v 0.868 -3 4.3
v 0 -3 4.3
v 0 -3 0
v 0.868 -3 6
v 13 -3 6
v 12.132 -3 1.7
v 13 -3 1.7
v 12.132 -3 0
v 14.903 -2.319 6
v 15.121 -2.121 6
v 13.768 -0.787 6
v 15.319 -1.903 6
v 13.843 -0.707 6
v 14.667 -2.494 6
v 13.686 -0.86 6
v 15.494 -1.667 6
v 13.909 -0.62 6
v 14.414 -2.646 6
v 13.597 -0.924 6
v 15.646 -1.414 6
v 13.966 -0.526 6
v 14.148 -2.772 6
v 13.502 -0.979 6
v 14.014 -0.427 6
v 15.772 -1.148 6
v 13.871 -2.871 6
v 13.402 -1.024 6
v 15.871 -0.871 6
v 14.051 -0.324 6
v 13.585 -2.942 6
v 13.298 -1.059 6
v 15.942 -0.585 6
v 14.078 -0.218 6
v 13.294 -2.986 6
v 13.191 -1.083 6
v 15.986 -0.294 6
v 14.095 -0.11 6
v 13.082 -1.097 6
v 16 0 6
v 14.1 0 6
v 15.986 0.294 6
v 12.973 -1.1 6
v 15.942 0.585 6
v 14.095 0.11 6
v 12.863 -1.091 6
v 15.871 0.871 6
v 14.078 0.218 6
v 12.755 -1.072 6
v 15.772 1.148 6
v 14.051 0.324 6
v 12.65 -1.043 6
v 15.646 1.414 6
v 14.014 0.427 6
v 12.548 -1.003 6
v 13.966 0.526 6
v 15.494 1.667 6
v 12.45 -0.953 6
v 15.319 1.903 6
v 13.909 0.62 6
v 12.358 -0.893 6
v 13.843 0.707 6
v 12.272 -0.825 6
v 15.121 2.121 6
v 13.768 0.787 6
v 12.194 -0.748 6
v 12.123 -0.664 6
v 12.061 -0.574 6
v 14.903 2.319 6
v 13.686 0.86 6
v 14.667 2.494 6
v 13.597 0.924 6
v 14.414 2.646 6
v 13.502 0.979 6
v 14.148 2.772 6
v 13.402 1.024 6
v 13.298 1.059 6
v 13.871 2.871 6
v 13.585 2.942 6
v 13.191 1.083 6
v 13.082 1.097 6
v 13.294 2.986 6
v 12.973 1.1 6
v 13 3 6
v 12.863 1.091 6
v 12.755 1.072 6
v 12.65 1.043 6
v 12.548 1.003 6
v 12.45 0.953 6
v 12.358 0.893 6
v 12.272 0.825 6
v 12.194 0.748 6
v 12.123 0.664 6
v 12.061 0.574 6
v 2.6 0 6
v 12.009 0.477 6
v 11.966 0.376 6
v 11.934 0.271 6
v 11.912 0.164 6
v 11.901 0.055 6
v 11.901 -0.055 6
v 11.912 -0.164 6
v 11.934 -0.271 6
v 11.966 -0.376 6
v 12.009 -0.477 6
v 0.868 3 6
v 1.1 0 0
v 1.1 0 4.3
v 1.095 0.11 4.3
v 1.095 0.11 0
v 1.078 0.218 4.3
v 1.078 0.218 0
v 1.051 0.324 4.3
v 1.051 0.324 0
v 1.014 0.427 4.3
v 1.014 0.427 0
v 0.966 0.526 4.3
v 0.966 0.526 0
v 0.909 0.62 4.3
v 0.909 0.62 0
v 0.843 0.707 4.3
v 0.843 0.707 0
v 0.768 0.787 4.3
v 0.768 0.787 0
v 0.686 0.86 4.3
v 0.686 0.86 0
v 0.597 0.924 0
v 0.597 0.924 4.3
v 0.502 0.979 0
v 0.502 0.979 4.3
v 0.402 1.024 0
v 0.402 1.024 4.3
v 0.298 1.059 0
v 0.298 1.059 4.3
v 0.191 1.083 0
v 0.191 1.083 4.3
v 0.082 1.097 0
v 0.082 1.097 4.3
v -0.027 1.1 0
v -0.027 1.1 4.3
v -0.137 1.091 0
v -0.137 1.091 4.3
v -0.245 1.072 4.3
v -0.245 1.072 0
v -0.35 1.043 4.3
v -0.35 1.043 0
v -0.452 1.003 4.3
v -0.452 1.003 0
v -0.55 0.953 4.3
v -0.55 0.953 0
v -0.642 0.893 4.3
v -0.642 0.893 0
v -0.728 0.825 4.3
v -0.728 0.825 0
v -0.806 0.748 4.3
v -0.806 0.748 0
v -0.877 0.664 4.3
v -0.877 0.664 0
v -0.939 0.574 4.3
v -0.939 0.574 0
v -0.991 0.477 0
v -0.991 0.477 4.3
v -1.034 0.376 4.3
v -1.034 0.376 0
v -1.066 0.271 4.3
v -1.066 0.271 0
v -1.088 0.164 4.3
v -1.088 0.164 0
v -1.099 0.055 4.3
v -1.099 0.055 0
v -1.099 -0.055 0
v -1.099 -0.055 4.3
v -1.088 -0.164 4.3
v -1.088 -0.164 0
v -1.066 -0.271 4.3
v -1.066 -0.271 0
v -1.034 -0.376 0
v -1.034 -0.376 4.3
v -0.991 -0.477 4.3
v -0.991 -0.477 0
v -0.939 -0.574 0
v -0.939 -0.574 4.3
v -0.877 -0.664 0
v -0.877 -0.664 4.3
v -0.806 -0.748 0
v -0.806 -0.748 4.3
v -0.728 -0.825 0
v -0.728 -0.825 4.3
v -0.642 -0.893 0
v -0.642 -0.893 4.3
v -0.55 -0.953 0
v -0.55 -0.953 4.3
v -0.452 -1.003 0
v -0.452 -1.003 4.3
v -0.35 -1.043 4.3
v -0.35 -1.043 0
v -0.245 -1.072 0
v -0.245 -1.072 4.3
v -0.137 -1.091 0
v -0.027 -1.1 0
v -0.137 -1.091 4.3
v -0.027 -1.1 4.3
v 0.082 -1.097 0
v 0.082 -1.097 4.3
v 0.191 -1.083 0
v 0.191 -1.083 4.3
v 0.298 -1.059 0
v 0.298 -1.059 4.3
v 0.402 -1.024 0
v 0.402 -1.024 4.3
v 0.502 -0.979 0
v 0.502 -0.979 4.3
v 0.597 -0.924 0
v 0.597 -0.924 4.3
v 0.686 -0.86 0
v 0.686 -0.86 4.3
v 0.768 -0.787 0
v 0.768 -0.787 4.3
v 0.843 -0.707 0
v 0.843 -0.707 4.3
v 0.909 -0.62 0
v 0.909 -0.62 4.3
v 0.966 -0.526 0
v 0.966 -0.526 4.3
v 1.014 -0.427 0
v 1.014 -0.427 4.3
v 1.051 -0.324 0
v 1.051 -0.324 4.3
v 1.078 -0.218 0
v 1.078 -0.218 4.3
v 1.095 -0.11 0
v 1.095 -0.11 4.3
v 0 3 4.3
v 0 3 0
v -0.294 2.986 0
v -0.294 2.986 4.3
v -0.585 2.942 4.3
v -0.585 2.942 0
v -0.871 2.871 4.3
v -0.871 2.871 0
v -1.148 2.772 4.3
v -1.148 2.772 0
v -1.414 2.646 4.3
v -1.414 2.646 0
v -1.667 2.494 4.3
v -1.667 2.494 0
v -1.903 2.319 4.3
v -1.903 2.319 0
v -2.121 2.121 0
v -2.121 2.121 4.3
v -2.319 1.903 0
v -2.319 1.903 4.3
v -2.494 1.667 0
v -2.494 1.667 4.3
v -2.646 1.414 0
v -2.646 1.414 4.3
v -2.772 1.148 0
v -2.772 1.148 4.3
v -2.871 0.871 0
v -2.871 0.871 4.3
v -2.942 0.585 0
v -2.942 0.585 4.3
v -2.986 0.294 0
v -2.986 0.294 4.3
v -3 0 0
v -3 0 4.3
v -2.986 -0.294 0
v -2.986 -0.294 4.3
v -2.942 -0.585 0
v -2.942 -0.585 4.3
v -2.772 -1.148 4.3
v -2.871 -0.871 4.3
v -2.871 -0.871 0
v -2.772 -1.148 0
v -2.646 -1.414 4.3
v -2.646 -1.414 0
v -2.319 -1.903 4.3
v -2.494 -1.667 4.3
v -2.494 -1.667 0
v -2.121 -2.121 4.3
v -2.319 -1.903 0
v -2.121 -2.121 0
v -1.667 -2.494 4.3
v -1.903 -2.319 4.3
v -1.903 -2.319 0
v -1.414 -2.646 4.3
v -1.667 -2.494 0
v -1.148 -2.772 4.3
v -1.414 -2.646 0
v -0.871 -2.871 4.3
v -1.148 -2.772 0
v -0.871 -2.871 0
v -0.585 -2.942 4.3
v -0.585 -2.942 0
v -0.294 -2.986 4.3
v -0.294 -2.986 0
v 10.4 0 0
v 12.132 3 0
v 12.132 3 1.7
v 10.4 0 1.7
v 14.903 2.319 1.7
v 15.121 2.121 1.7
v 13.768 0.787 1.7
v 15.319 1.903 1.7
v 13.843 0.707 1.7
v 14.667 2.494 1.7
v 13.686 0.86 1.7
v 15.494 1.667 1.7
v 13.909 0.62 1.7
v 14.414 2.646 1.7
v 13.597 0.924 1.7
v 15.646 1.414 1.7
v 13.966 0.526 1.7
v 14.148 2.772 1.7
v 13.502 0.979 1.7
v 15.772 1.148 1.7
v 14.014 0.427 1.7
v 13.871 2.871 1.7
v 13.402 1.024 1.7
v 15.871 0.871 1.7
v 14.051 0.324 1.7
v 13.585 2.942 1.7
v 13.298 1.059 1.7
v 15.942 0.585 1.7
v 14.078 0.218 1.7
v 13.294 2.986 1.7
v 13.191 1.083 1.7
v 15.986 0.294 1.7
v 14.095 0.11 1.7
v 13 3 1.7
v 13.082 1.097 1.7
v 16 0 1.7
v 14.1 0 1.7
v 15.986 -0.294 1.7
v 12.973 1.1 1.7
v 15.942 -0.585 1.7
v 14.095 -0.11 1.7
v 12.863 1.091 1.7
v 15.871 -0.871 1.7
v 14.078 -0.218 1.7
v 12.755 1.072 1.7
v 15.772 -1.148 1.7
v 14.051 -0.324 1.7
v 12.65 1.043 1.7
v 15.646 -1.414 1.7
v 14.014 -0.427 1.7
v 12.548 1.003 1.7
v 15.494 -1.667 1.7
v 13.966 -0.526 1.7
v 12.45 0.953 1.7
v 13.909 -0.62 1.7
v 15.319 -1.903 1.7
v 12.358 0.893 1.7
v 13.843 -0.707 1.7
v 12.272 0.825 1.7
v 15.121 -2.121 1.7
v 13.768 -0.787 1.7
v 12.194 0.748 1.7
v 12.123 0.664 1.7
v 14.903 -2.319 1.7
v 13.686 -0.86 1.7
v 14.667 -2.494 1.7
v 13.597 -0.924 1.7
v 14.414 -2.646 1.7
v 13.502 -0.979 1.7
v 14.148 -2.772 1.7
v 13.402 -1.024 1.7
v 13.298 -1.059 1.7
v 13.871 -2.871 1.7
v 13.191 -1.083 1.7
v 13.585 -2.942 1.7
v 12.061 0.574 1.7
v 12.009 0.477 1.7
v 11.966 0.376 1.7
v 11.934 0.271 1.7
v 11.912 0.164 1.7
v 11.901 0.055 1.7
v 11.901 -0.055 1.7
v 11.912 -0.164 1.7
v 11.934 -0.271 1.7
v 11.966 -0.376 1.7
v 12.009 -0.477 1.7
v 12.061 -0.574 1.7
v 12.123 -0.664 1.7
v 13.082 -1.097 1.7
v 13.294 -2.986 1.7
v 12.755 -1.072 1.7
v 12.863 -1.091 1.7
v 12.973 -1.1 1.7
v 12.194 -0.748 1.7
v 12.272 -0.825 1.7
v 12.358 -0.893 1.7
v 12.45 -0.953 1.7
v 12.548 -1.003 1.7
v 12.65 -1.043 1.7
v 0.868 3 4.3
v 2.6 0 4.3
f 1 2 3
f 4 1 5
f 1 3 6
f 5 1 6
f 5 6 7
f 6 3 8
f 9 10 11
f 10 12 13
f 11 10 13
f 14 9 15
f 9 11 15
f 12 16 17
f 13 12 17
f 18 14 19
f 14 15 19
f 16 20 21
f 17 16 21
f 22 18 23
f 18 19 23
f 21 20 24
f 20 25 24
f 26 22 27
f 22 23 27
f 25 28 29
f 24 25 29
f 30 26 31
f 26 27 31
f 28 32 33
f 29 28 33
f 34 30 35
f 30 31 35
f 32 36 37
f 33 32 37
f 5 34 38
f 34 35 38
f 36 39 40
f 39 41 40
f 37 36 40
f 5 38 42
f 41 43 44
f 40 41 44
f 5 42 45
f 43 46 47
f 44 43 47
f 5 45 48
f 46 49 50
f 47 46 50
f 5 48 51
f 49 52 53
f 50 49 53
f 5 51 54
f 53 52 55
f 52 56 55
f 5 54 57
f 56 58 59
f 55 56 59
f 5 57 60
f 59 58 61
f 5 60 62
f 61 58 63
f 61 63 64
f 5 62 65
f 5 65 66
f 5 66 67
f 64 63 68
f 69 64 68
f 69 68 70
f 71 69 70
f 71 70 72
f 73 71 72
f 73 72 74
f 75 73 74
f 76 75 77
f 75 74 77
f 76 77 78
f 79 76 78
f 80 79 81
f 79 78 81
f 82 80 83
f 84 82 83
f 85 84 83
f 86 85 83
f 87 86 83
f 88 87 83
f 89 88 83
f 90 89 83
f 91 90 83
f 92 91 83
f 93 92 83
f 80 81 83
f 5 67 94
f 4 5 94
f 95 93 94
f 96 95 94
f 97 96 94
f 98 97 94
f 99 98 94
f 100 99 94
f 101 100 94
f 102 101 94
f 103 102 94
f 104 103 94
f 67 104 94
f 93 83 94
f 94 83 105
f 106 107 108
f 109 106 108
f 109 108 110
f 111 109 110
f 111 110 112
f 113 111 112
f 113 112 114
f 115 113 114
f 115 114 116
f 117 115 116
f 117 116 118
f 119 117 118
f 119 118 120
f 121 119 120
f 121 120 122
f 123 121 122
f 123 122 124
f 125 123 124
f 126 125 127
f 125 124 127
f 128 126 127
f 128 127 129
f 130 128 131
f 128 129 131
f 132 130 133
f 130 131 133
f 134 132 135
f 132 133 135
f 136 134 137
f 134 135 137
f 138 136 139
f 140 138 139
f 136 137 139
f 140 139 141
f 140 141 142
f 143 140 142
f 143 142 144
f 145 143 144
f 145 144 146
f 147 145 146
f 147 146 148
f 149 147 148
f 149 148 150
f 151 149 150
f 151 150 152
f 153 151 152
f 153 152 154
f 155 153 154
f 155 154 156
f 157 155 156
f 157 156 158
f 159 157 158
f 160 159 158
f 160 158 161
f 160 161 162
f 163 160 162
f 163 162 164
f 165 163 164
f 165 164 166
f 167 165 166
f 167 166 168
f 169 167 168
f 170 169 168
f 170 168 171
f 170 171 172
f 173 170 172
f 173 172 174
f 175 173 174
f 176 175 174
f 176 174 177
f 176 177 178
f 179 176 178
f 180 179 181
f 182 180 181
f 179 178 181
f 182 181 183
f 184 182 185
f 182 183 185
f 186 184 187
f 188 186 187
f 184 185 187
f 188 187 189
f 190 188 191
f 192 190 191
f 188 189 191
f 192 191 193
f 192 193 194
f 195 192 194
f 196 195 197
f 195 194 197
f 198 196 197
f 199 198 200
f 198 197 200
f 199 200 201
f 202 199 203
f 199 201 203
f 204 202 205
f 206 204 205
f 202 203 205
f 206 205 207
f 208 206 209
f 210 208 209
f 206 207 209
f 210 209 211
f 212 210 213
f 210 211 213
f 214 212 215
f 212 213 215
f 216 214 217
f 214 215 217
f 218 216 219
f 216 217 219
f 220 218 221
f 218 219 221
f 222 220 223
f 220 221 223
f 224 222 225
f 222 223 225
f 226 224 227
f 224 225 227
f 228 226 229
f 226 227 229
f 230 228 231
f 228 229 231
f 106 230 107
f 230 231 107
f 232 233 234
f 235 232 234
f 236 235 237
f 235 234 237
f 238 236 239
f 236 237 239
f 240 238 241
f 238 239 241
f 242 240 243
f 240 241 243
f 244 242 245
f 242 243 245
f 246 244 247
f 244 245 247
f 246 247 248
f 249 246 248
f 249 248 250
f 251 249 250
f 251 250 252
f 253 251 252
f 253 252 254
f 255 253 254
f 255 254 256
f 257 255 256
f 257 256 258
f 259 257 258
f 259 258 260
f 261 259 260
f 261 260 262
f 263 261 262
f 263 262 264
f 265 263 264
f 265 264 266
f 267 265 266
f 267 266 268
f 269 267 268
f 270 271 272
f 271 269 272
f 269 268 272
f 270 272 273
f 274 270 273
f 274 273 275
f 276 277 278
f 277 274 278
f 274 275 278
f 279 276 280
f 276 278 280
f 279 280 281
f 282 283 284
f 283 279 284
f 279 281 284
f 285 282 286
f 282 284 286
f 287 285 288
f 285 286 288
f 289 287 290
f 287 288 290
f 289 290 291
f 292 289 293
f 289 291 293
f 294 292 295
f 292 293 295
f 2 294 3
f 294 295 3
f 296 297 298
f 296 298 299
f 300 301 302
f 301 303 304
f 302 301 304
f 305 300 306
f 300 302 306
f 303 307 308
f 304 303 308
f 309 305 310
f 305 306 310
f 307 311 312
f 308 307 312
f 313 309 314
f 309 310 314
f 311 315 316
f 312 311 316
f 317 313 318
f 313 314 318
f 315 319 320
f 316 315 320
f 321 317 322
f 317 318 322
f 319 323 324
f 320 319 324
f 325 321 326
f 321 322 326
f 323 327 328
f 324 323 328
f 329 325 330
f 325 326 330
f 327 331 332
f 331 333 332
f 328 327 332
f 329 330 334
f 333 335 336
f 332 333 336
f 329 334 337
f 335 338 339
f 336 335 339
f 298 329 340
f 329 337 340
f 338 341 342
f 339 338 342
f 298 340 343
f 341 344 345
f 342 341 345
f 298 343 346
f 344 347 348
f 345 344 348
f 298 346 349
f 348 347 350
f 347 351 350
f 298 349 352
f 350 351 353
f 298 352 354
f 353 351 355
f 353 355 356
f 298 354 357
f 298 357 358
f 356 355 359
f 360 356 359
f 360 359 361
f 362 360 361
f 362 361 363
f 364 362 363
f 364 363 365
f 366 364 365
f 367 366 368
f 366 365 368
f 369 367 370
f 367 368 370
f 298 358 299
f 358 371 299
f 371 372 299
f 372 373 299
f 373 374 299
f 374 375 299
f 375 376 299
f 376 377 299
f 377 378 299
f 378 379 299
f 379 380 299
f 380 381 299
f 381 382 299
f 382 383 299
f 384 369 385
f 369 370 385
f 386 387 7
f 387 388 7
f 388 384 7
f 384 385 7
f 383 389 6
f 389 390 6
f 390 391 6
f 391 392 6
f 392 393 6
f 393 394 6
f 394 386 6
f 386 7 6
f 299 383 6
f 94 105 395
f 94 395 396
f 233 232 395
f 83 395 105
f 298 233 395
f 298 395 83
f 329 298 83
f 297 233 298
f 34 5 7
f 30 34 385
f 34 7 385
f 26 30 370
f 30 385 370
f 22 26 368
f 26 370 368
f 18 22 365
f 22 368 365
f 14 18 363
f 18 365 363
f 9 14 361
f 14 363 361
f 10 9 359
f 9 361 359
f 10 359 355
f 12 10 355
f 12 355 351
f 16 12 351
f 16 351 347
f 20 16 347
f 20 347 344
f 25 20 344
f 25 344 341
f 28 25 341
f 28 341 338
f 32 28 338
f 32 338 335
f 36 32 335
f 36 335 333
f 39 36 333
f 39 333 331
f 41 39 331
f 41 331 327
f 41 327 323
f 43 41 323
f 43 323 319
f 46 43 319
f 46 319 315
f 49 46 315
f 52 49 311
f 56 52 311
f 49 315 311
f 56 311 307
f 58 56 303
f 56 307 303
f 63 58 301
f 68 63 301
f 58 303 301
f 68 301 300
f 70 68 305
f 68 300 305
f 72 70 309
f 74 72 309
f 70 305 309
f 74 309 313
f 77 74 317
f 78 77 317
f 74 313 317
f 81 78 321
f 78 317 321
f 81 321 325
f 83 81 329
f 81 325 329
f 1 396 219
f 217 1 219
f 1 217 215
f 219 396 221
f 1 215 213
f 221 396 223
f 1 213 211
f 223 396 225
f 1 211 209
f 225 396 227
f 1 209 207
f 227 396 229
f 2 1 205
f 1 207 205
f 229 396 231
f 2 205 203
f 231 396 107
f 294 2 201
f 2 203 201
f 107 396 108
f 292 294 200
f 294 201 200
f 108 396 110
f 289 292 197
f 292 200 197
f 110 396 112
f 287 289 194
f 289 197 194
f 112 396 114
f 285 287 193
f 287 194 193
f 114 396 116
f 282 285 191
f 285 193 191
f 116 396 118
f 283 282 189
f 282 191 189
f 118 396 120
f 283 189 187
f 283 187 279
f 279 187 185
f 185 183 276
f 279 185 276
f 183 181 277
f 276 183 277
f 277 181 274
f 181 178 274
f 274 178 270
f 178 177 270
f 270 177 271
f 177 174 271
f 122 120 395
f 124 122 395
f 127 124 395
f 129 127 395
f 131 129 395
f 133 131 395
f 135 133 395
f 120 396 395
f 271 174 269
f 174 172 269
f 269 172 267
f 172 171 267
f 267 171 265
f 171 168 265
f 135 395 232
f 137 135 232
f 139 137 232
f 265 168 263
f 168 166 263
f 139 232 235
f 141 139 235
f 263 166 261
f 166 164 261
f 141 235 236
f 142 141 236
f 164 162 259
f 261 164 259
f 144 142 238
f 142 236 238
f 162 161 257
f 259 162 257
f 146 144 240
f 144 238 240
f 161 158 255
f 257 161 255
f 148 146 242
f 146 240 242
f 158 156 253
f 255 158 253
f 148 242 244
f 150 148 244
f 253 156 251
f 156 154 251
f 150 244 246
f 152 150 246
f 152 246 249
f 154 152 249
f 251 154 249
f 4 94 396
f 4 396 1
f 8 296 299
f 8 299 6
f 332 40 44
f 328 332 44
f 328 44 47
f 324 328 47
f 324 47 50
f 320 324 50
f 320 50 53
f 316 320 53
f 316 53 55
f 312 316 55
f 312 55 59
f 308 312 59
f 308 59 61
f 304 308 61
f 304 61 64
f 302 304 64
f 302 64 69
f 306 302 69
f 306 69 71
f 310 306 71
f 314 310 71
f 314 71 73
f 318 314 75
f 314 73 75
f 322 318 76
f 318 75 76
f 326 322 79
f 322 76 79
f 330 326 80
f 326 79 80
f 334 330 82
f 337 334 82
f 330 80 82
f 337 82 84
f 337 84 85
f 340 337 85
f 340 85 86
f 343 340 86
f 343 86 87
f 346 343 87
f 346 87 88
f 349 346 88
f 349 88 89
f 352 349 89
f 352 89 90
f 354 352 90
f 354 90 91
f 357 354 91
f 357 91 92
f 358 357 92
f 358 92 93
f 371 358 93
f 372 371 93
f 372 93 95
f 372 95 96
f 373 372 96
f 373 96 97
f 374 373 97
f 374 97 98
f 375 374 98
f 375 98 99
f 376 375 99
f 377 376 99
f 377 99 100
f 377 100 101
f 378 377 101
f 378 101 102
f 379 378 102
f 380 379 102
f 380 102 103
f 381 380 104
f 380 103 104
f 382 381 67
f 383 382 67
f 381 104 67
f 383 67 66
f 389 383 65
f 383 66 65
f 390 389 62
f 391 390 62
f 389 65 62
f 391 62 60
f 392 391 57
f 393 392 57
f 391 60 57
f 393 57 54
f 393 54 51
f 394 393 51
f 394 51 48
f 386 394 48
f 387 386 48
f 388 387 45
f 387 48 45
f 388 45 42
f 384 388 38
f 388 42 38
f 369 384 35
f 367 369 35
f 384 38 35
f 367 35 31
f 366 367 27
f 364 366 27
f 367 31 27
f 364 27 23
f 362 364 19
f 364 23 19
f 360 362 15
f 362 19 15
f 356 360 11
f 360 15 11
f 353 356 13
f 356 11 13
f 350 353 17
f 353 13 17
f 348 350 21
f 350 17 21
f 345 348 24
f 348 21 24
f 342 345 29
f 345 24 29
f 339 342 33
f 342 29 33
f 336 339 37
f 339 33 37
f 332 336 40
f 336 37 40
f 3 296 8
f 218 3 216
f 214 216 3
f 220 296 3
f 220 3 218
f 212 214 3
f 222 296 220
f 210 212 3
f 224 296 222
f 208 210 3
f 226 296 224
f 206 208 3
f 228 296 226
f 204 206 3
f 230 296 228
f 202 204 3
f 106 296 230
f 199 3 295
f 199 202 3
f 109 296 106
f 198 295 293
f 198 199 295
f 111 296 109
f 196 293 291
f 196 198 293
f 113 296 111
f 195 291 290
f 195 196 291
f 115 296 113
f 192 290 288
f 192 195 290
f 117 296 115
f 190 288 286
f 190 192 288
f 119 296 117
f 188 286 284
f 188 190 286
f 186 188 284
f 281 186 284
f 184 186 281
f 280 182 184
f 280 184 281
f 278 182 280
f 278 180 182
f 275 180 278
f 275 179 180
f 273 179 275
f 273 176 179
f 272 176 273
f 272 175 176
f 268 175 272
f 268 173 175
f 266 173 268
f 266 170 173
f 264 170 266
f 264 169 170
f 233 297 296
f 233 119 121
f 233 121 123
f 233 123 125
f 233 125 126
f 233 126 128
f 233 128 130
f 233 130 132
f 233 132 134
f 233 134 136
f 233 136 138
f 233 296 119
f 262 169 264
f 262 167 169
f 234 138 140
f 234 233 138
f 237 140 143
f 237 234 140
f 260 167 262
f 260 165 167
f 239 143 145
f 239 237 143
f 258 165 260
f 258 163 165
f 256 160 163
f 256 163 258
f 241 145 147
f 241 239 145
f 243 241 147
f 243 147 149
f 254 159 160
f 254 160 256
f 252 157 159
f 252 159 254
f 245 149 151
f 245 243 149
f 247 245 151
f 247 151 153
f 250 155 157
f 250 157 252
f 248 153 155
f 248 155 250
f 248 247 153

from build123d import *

# Parameters (mm, degrees)
PAD_DEPTH       = 6
SKETCH002_R     = 1.1
POCKET_DEPTH    = 6.001
POCKET001_DEPTH = 1.7
POCKET002_DEPTH = 1.7


with BuildPart() as part:
    # Sketch → Pad (new body)
    with BuildSketch(Plane.XY):
        with BuildLine():
            Line((0, 3), (13, 3))
            ThreePointArc((13, -3), (15.999986, 0), (13, 3))
            Line((0, -3), (13, -3))
            ThreePointArc((0, 3), (-3, 0), (0, -3))
        make_face()
    extrude(amount=PAD_DEPTH)

    # Sketch002 → Pocket (cut, through all)
    with BuildSketch(Plane.XY.offset(6)):
        Circle(SKETCH002_R)
        with Locations((13, 0)):
            Circle(SKETCH002_R)
    extrude(amount=-POCKET_DEPTH, mode=Mode.SUBTRACT)

    # Sketch003 → Pocket001 (cut)
    with BuildSketch(Plane.XY.offset(6)):
        Polygon((2.6, 0), (0.100002, -4.330128), (-3.899998, -4.330128), (-3.899998, 4.330126), (0.099998, 4.330126), align=None)
    extrude(amount=-POCKET001_DEPTH, mode=Mode.SUBTRACT)

    # Sketch004 → Pocket002 (cut)
    with BuildSketch(Plane(origin=(0, 0, 0), x_dir=(1, 0, 0), z_dir=(0, 0, -1))):
        Polygon((10.4, 0), (12.678902, 3.947175), (16.678902, 3.947175), (16.678902, -3.947175), (12.678903, -3.947175), align=None)
    extrude(amount=-POCKET002_DEPTH, mode=Mode.SUBTRACT)


solid = part.part
